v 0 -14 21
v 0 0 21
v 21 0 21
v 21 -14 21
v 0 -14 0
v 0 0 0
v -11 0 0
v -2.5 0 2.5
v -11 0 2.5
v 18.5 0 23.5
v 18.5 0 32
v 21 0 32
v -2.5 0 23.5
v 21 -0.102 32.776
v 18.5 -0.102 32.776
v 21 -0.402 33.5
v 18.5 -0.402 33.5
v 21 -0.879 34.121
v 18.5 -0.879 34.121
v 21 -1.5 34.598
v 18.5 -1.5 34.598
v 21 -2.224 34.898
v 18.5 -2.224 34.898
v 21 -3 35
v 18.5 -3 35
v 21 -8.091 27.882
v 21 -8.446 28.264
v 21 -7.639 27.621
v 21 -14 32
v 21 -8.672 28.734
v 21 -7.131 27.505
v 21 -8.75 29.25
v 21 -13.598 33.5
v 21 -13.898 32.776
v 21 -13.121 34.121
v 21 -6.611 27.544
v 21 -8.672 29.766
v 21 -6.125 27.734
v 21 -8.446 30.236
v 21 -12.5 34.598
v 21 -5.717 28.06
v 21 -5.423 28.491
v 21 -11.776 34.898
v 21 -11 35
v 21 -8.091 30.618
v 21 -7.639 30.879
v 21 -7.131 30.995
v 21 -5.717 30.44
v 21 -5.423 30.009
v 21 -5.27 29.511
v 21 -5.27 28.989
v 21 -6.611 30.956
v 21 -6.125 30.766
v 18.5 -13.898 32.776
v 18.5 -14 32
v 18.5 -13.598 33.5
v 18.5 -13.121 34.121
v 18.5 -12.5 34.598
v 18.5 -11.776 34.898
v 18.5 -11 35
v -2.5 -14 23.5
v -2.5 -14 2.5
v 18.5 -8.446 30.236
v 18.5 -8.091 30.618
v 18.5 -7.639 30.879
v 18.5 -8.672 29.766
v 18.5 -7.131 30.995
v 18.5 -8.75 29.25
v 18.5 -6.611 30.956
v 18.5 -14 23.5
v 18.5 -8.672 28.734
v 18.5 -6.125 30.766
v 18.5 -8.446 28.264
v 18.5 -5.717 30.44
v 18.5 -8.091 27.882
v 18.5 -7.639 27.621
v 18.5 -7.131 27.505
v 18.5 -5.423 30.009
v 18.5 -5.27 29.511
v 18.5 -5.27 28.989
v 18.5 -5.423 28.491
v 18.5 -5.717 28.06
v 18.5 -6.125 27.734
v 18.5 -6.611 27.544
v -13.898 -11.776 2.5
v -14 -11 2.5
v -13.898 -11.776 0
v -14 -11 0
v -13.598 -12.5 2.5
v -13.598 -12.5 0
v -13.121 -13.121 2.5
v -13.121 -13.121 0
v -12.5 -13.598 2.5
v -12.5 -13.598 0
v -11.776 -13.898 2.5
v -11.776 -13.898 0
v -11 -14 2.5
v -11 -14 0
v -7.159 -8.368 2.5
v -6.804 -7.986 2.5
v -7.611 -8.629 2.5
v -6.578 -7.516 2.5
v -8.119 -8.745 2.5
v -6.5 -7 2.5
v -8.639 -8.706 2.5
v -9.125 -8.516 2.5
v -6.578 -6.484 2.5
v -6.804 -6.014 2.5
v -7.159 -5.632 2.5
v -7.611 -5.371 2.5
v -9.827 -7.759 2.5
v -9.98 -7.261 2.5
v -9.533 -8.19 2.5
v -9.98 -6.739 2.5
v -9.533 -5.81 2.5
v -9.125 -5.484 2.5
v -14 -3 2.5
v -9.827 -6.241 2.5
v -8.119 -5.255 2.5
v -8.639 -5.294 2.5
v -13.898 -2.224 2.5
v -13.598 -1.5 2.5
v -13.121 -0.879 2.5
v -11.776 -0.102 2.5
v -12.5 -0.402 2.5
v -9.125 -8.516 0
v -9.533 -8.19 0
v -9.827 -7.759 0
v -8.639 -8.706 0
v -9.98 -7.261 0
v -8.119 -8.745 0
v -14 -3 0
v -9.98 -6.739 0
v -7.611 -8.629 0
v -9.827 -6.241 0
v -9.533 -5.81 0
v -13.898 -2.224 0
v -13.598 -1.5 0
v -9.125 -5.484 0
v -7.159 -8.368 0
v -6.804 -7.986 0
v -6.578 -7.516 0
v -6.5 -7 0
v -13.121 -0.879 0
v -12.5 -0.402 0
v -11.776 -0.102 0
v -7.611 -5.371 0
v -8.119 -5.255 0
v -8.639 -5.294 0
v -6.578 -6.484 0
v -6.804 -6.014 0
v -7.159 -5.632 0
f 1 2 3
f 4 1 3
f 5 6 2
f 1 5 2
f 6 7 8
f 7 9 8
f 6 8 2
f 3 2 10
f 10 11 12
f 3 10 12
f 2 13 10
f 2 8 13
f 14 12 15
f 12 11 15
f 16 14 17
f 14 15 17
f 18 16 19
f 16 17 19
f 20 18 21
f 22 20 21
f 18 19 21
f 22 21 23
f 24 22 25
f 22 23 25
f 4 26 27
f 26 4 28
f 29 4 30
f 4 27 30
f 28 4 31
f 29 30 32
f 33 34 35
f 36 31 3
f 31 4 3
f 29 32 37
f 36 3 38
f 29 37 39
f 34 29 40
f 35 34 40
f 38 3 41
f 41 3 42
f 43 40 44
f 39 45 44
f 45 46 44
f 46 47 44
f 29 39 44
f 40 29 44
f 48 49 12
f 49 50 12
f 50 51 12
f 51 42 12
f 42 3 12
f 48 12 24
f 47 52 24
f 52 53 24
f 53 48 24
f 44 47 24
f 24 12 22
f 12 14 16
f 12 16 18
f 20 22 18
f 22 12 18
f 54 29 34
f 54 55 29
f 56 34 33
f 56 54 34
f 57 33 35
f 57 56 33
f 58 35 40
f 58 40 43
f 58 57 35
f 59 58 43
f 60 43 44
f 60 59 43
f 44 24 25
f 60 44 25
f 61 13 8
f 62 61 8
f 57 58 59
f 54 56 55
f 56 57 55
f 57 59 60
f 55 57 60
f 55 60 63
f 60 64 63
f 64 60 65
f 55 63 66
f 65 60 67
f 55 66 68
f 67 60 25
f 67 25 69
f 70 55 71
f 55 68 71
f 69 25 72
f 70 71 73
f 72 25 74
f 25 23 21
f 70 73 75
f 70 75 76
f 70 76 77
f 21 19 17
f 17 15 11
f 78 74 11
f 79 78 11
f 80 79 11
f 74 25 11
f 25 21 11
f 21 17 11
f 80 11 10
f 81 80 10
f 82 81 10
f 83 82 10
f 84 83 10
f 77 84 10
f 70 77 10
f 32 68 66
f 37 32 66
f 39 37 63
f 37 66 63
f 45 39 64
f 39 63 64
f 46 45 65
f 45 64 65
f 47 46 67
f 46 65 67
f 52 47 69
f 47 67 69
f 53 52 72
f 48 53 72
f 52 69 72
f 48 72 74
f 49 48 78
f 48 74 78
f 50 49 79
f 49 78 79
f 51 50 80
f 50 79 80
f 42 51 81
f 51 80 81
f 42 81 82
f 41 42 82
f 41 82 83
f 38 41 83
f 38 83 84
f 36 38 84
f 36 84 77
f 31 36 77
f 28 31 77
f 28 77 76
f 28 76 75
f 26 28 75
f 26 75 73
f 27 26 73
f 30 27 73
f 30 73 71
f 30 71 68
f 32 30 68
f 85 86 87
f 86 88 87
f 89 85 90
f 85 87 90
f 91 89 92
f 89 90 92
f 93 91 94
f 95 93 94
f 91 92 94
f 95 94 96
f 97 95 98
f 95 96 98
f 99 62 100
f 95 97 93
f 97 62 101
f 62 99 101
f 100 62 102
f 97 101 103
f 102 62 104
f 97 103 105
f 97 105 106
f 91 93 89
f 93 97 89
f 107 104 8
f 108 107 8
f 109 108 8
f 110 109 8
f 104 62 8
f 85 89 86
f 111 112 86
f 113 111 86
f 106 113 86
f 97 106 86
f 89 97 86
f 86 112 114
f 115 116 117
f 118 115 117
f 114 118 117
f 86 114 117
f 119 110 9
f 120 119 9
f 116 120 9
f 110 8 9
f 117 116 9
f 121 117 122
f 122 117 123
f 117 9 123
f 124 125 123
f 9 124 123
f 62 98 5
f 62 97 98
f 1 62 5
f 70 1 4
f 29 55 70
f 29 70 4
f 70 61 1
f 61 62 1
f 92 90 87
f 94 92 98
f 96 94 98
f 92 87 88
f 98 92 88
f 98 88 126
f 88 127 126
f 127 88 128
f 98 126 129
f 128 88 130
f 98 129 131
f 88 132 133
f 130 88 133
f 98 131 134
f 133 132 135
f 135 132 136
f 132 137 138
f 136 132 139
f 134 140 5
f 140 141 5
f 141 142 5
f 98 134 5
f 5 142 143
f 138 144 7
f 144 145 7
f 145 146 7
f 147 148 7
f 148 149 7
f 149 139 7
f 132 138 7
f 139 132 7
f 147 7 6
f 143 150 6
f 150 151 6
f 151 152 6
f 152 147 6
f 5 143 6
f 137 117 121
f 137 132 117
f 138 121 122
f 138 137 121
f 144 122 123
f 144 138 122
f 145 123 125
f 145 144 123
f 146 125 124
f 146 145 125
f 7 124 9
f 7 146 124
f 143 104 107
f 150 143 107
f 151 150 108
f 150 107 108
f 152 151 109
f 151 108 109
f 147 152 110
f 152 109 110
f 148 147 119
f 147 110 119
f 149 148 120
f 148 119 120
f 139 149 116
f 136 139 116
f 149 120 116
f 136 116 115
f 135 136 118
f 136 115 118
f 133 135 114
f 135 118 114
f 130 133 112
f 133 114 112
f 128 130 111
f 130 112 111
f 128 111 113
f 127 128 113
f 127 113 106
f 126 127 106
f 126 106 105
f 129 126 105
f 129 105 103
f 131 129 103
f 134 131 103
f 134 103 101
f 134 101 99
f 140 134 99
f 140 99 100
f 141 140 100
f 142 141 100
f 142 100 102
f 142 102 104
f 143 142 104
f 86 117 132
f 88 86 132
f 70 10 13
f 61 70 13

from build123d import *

# Parameters (mm, degrees)
F1_DEPTH = 14
F2_R     = 1.75
F3_DEPTH = 2.501
F4_R     = 1.75
F5_DEPTH = 25
F6_R     = 3


with BuildPart() as f1:
    # F0 (on Front) → F1 (new body)
    with BuildSketch(Plane.XZ):
        Polygon((-14, 0), (0, 0), (0, 21), (21, 21), (21, 35), (18.5, 35), (18.5, 23.5), (-2.5, 23.5), (-2.5, 2.5), (-14, 2.5), align=None)
    extrude(amount=F1_DEPTH)

    # F2 (on face) → F3 (cut, through all)
    with BuildSketch(Plane(origin=(18.5, 0, 0), x_dir=(0, -1, 0), z_dir=(-1, 0, 0))):
        with Locations((7, 29.25)):
            Circle(F2_R)
    extrude(amount=-F3_DEPTH, mode=Mode.SUBTRACT)

    # F4 (on face) → F5 (cut)
    with BuildSketch(Plane.XY.offset(2.5)):
        with Locations((-8.25, -7)):
            Circle(F4_R)
    extrude(amount=-F5_DEPTH, mode=Mode.SUBTRACT)

    # F6
    f6_edges = [f1.edges().sort_by_distance(p)[0] for p in [
        (-14, -14, 1.25),
        (-14, 0, 1.25),
        (19.75, -14, 35),
        (19.75, 0, 35),
    ]]
    fillet(f6_edges, radius=F6_R)


solid = f1.part
